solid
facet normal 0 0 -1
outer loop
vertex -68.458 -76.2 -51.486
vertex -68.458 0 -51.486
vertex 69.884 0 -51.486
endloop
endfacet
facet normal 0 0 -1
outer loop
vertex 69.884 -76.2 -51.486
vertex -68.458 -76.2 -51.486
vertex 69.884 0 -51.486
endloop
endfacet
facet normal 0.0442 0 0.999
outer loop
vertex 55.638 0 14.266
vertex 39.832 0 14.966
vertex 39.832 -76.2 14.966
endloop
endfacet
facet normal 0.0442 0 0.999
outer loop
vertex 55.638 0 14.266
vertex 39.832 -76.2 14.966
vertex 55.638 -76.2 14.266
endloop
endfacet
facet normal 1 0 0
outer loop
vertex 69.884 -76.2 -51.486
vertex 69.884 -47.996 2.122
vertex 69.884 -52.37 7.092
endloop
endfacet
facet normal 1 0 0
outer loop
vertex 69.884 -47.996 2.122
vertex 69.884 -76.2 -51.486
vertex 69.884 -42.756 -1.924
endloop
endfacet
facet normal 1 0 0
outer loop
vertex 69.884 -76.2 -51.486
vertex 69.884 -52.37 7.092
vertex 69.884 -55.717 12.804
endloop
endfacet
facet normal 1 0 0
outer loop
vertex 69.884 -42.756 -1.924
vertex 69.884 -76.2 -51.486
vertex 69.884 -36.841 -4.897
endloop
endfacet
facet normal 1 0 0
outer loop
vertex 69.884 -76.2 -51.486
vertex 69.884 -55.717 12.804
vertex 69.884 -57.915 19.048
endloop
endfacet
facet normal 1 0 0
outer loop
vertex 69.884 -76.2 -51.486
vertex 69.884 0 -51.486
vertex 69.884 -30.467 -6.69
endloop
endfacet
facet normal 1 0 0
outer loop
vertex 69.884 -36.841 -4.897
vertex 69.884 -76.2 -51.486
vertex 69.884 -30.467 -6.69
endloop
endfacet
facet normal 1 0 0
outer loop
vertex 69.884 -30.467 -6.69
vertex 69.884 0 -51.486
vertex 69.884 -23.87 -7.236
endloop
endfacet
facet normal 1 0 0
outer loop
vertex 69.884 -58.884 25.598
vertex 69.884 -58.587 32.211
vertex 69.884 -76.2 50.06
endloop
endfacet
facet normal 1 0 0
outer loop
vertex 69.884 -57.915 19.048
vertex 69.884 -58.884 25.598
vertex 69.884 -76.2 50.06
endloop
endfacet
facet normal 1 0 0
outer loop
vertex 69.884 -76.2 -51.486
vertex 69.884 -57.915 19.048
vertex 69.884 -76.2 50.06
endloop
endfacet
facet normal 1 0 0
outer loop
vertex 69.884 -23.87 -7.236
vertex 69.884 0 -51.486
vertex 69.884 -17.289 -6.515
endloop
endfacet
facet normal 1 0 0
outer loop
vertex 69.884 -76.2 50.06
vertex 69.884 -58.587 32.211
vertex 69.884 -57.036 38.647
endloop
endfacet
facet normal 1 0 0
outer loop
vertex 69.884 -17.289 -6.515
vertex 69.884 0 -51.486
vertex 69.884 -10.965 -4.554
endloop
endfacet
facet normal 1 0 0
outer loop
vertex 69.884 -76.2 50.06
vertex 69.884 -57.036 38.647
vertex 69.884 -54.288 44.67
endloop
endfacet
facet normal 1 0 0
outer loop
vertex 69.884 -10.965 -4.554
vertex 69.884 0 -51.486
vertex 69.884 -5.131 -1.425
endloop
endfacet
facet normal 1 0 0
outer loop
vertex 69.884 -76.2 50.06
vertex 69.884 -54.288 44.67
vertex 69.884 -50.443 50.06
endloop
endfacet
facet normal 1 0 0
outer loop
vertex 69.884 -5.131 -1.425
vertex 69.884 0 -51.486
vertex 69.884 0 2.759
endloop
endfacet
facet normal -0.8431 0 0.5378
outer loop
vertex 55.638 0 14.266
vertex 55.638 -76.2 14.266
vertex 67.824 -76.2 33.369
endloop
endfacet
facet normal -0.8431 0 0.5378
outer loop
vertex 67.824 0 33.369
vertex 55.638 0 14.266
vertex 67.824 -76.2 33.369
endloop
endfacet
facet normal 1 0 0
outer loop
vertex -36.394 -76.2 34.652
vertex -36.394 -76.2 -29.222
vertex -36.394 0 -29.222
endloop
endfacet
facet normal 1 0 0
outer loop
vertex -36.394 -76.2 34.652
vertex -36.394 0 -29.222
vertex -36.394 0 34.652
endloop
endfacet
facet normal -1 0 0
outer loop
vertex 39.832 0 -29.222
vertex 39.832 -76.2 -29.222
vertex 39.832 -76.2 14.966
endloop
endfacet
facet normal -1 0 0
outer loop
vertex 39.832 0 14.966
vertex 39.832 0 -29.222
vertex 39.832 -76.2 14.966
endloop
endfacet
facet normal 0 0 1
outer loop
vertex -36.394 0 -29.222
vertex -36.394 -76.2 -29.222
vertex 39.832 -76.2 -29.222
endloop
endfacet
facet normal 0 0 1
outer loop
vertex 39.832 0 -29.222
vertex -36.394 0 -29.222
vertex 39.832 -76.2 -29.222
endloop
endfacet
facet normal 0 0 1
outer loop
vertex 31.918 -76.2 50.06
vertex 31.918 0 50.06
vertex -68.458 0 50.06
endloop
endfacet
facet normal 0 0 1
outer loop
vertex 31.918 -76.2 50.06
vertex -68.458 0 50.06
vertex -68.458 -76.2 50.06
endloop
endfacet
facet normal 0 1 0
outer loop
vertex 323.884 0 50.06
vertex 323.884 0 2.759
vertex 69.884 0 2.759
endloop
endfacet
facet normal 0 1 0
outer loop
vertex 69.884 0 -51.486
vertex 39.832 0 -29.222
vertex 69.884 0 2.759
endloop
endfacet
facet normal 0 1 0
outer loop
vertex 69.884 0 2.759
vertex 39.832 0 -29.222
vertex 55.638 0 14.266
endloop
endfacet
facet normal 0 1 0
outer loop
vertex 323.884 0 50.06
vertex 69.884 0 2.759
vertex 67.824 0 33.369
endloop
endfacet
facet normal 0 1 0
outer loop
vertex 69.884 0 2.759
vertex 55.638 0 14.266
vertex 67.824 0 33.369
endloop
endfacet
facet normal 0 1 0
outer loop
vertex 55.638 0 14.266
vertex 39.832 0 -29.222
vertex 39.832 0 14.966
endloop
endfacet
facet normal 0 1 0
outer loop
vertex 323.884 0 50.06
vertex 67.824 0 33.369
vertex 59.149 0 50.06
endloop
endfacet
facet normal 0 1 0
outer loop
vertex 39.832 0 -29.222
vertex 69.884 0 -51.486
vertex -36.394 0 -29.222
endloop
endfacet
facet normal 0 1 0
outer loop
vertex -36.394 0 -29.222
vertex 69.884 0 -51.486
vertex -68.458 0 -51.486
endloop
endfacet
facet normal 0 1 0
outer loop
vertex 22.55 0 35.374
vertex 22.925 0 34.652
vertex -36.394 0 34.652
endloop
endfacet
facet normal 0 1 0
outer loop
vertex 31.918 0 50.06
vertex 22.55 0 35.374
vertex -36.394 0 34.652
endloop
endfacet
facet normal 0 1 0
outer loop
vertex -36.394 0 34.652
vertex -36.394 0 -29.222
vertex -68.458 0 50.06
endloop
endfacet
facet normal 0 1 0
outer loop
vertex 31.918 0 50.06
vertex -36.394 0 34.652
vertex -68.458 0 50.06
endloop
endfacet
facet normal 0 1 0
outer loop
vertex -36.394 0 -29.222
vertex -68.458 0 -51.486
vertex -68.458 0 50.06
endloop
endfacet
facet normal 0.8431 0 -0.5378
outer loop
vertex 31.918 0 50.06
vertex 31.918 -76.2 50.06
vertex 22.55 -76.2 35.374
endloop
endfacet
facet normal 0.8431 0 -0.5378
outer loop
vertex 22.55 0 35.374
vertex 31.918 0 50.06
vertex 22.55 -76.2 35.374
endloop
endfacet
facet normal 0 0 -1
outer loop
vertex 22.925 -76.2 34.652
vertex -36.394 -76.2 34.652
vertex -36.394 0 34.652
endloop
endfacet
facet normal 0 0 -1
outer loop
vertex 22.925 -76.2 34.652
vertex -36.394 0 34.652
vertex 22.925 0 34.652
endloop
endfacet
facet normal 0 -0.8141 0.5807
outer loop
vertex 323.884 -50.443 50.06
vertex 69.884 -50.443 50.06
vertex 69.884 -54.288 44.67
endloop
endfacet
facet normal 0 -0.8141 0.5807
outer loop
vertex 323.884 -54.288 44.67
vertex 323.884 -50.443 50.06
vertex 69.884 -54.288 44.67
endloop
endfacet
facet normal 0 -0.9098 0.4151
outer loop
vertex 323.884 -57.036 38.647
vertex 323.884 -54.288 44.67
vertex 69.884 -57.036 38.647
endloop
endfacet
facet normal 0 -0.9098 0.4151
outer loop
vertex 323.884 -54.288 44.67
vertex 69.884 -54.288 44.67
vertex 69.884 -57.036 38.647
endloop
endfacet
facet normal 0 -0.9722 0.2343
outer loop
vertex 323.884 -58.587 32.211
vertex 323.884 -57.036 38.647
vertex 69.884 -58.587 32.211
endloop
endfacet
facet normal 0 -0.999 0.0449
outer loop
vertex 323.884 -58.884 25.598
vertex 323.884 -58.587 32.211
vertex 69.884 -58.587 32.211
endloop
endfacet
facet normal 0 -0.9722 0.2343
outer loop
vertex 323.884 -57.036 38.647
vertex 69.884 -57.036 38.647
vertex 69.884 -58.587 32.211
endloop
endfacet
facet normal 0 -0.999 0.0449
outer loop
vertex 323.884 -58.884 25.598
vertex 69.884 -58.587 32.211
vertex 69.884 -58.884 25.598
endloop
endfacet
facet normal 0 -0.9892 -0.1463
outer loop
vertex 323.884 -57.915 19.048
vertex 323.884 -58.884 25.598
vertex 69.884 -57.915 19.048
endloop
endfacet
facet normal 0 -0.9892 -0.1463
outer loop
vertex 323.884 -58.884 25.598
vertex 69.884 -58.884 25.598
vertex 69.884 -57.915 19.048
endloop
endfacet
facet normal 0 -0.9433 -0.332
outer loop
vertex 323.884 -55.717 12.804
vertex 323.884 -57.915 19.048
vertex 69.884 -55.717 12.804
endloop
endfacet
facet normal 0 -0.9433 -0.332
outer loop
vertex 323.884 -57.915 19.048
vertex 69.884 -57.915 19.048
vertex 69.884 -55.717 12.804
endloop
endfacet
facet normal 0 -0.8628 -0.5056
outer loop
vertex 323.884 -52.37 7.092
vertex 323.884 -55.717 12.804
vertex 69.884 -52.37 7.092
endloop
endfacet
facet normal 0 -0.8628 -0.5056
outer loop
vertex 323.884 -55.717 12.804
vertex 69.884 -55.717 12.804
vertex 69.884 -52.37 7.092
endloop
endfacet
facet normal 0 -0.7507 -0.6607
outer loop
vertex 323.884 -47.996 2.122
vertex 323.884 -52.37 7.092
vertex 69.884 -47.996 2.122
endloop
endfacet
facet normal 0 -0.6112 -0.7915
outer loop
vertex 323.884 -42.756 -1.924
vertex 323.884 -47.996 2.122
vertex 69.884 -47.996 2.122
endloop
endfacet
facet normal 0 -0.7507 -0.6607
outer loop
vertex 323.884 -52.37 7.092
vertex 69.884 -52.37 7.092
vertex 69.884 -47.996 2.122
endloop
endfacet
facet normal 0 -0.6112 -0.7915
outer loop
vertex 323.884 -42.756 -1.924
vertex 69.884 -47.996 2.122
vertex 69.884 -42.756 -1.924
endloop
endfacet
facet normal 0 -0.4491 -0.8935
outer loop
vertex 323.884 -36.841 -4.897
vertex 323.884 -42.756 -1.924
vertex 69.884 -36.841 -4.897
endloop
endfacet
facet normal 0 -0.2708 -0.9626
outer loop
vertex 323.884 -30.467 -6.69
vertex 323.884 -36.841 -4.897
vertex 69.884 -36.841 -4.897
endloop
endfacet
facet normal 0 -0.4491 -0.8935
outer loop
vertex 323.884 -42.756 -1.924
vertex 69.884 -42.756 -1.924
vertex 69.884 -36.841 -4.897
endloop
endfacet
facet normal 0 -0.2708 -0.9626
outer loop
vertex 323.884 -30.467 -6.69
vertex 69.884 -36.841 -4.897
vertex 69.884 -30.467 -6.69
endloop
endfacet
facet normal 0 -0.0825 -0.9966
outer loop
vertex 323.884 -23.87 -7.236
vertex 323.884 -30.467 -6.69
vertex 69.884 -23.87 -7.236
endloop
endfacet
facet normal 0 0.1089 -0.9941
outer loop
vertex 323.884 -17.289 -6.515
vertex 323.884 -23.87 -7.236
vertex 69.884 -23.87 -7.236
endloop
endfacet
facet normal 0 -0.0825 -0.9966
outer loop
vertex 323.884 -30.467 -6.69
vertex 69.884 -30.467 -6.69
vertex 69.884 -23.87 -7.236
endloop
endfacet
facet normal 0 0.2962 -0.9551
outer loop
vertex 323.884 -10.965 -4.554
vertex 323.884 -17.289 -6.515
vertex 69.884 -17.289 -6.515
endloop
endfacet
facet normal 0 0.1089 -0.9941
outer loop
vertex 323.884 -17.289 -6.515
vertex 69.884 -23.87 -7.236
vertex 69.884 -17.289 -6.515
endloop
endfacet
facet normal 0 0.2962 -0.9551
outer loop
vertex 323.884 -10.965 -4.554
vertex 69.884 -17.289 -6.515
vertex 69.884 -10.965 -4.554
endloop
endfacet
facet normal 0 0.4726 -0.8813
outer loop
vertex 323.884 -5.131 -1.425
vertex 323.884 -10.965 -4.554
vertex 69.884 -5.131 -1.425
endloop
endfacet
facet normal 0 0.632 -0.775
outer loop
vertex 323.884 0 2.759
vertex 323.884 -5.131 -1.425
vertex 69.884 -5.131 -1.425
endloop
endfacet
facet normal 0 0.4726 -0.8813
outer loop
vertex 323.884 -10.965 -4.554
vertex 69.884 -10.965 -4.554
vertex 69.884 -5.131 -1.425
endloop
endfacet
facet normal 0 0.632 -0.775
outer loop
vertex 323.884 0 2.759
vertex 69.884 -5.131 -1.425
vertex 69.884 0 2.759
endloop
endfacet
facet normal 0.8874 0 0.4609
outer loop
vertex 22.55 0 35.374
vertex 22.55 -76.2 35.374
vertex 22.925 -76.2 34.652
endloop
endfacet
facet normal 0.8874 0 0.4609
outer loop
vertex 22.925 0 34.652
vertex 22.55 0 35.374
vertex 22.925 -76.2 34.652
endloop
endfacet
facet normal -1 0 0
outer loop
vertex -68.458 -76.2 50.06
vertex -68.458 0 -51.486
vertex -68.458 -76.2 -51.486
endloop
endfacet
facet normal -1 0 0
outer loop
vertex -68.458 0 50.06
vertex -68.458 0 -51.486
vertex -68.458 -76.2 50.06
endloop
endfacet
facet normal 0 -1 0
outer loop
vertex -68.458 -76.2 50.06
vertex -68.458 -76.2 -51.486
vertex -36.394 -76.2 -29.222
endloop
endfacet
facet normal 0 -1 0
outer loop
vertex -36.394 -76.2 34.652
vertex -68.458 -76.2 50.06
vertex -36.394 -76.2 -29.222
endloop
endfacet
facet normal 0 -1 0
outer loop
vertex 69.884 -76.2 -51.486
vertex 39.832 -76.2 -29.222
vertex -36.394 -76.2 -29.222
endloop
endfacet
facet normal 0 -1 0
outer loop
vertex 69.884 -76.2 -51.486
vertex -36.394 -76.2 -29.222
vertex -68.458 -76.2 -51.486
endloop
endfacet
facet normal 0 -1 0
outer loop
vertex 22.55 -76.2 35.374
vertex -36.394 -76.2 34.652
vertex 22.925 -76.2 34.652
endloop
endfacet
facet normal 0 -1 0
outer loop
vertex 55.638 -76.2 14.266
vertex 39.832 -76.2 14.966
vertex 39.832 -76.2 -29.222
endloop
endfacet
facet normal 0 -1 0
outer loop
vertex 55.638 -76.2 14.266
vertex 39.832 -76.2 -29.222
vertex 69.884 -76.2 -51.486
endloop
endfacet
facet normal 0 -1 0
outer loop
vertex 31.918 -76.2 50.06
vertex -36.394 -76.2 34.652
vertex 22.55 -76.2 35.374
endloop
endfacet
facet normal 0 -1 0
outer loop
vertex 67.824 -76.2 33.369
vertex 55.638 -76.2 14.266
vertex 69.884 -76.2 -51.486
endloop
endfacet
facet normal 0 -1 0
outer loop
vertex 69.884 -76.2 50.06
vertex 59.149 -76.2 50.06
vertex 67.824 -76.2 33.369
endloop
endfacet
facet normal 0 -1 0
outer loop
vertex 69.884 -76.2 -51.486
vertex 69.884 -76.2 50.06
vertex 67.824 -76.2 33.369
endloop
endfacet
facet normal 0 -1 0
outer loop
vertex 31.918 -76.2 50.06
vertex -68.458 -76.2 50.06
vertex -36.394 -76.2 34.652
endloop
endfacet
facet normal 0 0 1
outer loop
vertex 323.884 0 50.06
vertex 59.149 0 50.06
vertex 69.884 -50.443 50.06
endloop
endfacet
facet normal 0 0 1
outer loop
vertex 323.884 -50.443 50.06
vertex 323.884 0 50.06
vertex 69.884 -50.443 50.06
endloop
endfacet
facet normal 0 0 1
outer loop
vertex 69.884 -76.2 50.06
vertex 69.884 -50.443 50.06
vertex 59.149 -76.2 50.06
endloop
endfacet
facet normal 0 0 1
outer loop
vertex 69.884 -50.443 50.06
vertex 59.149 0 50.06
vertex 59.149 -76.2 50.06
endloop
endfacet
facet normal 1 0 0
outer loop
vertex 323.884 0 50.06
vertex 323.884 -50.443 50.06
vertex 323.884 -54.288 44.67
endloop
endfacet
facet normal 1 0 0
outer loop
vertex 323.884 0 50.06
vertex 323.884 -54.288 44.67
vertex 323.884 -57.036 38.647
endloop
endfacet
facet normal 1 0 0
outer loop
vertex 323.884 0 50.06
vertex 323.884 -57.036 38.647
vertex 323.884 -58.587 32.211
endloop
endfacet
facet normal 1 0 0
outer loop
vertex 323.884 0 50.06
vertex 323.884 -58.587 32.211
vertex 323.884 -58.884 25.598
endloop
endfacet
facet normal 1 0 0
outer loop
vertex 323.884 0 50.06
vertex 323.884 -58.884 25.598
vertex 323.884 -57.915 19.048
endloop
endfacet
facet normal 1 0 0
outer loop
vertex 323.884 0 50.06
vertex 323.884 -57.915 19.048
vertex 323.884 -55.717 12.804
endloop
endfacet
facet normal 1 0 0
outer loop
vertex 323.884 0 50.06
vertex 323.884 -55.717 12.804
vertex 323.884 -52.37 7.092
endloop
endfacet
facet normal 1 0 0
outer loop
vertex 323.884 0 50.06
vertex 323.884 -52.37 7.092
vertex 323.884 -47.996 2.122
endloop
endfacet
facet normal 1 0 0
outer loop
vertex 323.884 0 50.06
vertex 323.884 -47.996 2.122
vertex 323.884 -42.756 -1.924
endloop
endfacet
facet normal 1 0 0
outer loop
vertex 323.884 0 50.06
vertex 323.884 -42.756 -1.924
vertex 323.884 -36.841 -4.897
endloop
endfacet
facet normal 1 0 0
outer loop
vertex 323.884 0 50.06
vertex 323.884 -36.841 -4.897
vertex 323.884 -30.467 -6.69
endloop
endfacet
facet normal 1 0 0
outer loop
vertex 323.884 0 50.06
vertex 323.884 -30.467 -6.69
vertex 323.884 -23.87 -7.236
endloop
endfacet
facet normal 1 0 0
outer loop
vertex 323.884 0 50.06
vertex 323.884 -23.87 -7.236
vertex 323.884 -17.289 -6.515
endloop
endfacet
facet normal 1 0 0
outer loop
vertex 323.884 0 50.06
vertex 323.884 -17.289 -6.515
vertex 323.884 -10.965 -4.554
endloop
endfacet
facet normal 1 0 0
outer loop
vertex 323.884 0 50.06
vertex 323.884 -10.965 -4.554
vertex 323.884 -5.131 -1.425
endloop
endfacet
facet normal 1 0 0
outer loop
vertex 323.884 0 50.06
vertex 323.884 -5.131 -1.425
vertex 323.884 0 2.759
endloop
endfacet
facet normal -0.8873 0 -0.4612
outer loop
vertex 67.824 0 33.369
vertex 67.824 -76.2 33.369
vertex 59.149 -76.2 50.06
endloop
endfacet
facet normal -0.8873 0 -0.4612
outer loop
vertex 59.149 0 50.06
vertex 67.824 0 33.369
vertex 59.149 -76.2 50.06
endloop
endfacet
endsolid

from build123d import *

# Parameters (mm, degrees)
F0_W     = 138.3417099714
F0_H     = 101.5456728637
F1_DEPTH = 76.2
F2_W     = 76.2257091701
F2_H     = 63.8742726296
F3_DEPTH = 101.6
F5_DEPTH = 254
F7_DEPTH = 101.6


with BuildPart() as f1:
    # F0 (on Front) → F1 (new body)
    with BuildSketch(Plane.XZ):
        with Locations((0.7131025195, -0.7131006569)):
            Rectangle(F0_W, F0_H)
    extrude(amount=F1_DEPTH)

    # F2 (on face) → F3 (cut)
    with BuildSketch(Plane.XZ.offset(76.2)):
        with Locations((1.7188172787, 2.7152718976)):
            Rectangle(F2_W, F2_H)
    extrude(amount=-F3_DEPTH, mode=Mode.SUBTRACT)

    # F4 (on face) → F5 (join)
    with BuildSketch(Plane.YZ.offset(69.8839575052)):
        with BuildLine():
            Line((0, 50.059735775), (-50.4431385903, 50.059735775))
            ThreePointArc((-50.4431385903, 50.059735775), (-47.9958991329, 2.1220411863), (0, 2.7586021562))
            Line((0, 2.7586021562), (0, 50.059735775))
        make_face()
    extrude(amount=F5_DEPTH)

    # F6 (on face) → F7 (cut)
    with BuildSketch(Plane.XZ.offset(76.2)):
        Polygon((31.9183138803, 50.059735775), (59.1486387648, 50.059735775), (57.3735188693, 53.4748122682), (34.7362639383, 54.4770613606), align=None)
        Polygon((55.6375725195, 14.2659365838), (67.8241731599, 33.3692498798), (59.1486387648, 50.059735775), (31.9183138803, 50.059735775), (22.5496632978, 35.3737480645), (22.9246079661, 34.6524082124), (39.8316718638, 34.6524082124), (39.8316718638, 14.9657321038), align=None)
    extrude(amount=-F7_DEPTH, mode=Mode.SUBTRACT)


solid = f1.part
